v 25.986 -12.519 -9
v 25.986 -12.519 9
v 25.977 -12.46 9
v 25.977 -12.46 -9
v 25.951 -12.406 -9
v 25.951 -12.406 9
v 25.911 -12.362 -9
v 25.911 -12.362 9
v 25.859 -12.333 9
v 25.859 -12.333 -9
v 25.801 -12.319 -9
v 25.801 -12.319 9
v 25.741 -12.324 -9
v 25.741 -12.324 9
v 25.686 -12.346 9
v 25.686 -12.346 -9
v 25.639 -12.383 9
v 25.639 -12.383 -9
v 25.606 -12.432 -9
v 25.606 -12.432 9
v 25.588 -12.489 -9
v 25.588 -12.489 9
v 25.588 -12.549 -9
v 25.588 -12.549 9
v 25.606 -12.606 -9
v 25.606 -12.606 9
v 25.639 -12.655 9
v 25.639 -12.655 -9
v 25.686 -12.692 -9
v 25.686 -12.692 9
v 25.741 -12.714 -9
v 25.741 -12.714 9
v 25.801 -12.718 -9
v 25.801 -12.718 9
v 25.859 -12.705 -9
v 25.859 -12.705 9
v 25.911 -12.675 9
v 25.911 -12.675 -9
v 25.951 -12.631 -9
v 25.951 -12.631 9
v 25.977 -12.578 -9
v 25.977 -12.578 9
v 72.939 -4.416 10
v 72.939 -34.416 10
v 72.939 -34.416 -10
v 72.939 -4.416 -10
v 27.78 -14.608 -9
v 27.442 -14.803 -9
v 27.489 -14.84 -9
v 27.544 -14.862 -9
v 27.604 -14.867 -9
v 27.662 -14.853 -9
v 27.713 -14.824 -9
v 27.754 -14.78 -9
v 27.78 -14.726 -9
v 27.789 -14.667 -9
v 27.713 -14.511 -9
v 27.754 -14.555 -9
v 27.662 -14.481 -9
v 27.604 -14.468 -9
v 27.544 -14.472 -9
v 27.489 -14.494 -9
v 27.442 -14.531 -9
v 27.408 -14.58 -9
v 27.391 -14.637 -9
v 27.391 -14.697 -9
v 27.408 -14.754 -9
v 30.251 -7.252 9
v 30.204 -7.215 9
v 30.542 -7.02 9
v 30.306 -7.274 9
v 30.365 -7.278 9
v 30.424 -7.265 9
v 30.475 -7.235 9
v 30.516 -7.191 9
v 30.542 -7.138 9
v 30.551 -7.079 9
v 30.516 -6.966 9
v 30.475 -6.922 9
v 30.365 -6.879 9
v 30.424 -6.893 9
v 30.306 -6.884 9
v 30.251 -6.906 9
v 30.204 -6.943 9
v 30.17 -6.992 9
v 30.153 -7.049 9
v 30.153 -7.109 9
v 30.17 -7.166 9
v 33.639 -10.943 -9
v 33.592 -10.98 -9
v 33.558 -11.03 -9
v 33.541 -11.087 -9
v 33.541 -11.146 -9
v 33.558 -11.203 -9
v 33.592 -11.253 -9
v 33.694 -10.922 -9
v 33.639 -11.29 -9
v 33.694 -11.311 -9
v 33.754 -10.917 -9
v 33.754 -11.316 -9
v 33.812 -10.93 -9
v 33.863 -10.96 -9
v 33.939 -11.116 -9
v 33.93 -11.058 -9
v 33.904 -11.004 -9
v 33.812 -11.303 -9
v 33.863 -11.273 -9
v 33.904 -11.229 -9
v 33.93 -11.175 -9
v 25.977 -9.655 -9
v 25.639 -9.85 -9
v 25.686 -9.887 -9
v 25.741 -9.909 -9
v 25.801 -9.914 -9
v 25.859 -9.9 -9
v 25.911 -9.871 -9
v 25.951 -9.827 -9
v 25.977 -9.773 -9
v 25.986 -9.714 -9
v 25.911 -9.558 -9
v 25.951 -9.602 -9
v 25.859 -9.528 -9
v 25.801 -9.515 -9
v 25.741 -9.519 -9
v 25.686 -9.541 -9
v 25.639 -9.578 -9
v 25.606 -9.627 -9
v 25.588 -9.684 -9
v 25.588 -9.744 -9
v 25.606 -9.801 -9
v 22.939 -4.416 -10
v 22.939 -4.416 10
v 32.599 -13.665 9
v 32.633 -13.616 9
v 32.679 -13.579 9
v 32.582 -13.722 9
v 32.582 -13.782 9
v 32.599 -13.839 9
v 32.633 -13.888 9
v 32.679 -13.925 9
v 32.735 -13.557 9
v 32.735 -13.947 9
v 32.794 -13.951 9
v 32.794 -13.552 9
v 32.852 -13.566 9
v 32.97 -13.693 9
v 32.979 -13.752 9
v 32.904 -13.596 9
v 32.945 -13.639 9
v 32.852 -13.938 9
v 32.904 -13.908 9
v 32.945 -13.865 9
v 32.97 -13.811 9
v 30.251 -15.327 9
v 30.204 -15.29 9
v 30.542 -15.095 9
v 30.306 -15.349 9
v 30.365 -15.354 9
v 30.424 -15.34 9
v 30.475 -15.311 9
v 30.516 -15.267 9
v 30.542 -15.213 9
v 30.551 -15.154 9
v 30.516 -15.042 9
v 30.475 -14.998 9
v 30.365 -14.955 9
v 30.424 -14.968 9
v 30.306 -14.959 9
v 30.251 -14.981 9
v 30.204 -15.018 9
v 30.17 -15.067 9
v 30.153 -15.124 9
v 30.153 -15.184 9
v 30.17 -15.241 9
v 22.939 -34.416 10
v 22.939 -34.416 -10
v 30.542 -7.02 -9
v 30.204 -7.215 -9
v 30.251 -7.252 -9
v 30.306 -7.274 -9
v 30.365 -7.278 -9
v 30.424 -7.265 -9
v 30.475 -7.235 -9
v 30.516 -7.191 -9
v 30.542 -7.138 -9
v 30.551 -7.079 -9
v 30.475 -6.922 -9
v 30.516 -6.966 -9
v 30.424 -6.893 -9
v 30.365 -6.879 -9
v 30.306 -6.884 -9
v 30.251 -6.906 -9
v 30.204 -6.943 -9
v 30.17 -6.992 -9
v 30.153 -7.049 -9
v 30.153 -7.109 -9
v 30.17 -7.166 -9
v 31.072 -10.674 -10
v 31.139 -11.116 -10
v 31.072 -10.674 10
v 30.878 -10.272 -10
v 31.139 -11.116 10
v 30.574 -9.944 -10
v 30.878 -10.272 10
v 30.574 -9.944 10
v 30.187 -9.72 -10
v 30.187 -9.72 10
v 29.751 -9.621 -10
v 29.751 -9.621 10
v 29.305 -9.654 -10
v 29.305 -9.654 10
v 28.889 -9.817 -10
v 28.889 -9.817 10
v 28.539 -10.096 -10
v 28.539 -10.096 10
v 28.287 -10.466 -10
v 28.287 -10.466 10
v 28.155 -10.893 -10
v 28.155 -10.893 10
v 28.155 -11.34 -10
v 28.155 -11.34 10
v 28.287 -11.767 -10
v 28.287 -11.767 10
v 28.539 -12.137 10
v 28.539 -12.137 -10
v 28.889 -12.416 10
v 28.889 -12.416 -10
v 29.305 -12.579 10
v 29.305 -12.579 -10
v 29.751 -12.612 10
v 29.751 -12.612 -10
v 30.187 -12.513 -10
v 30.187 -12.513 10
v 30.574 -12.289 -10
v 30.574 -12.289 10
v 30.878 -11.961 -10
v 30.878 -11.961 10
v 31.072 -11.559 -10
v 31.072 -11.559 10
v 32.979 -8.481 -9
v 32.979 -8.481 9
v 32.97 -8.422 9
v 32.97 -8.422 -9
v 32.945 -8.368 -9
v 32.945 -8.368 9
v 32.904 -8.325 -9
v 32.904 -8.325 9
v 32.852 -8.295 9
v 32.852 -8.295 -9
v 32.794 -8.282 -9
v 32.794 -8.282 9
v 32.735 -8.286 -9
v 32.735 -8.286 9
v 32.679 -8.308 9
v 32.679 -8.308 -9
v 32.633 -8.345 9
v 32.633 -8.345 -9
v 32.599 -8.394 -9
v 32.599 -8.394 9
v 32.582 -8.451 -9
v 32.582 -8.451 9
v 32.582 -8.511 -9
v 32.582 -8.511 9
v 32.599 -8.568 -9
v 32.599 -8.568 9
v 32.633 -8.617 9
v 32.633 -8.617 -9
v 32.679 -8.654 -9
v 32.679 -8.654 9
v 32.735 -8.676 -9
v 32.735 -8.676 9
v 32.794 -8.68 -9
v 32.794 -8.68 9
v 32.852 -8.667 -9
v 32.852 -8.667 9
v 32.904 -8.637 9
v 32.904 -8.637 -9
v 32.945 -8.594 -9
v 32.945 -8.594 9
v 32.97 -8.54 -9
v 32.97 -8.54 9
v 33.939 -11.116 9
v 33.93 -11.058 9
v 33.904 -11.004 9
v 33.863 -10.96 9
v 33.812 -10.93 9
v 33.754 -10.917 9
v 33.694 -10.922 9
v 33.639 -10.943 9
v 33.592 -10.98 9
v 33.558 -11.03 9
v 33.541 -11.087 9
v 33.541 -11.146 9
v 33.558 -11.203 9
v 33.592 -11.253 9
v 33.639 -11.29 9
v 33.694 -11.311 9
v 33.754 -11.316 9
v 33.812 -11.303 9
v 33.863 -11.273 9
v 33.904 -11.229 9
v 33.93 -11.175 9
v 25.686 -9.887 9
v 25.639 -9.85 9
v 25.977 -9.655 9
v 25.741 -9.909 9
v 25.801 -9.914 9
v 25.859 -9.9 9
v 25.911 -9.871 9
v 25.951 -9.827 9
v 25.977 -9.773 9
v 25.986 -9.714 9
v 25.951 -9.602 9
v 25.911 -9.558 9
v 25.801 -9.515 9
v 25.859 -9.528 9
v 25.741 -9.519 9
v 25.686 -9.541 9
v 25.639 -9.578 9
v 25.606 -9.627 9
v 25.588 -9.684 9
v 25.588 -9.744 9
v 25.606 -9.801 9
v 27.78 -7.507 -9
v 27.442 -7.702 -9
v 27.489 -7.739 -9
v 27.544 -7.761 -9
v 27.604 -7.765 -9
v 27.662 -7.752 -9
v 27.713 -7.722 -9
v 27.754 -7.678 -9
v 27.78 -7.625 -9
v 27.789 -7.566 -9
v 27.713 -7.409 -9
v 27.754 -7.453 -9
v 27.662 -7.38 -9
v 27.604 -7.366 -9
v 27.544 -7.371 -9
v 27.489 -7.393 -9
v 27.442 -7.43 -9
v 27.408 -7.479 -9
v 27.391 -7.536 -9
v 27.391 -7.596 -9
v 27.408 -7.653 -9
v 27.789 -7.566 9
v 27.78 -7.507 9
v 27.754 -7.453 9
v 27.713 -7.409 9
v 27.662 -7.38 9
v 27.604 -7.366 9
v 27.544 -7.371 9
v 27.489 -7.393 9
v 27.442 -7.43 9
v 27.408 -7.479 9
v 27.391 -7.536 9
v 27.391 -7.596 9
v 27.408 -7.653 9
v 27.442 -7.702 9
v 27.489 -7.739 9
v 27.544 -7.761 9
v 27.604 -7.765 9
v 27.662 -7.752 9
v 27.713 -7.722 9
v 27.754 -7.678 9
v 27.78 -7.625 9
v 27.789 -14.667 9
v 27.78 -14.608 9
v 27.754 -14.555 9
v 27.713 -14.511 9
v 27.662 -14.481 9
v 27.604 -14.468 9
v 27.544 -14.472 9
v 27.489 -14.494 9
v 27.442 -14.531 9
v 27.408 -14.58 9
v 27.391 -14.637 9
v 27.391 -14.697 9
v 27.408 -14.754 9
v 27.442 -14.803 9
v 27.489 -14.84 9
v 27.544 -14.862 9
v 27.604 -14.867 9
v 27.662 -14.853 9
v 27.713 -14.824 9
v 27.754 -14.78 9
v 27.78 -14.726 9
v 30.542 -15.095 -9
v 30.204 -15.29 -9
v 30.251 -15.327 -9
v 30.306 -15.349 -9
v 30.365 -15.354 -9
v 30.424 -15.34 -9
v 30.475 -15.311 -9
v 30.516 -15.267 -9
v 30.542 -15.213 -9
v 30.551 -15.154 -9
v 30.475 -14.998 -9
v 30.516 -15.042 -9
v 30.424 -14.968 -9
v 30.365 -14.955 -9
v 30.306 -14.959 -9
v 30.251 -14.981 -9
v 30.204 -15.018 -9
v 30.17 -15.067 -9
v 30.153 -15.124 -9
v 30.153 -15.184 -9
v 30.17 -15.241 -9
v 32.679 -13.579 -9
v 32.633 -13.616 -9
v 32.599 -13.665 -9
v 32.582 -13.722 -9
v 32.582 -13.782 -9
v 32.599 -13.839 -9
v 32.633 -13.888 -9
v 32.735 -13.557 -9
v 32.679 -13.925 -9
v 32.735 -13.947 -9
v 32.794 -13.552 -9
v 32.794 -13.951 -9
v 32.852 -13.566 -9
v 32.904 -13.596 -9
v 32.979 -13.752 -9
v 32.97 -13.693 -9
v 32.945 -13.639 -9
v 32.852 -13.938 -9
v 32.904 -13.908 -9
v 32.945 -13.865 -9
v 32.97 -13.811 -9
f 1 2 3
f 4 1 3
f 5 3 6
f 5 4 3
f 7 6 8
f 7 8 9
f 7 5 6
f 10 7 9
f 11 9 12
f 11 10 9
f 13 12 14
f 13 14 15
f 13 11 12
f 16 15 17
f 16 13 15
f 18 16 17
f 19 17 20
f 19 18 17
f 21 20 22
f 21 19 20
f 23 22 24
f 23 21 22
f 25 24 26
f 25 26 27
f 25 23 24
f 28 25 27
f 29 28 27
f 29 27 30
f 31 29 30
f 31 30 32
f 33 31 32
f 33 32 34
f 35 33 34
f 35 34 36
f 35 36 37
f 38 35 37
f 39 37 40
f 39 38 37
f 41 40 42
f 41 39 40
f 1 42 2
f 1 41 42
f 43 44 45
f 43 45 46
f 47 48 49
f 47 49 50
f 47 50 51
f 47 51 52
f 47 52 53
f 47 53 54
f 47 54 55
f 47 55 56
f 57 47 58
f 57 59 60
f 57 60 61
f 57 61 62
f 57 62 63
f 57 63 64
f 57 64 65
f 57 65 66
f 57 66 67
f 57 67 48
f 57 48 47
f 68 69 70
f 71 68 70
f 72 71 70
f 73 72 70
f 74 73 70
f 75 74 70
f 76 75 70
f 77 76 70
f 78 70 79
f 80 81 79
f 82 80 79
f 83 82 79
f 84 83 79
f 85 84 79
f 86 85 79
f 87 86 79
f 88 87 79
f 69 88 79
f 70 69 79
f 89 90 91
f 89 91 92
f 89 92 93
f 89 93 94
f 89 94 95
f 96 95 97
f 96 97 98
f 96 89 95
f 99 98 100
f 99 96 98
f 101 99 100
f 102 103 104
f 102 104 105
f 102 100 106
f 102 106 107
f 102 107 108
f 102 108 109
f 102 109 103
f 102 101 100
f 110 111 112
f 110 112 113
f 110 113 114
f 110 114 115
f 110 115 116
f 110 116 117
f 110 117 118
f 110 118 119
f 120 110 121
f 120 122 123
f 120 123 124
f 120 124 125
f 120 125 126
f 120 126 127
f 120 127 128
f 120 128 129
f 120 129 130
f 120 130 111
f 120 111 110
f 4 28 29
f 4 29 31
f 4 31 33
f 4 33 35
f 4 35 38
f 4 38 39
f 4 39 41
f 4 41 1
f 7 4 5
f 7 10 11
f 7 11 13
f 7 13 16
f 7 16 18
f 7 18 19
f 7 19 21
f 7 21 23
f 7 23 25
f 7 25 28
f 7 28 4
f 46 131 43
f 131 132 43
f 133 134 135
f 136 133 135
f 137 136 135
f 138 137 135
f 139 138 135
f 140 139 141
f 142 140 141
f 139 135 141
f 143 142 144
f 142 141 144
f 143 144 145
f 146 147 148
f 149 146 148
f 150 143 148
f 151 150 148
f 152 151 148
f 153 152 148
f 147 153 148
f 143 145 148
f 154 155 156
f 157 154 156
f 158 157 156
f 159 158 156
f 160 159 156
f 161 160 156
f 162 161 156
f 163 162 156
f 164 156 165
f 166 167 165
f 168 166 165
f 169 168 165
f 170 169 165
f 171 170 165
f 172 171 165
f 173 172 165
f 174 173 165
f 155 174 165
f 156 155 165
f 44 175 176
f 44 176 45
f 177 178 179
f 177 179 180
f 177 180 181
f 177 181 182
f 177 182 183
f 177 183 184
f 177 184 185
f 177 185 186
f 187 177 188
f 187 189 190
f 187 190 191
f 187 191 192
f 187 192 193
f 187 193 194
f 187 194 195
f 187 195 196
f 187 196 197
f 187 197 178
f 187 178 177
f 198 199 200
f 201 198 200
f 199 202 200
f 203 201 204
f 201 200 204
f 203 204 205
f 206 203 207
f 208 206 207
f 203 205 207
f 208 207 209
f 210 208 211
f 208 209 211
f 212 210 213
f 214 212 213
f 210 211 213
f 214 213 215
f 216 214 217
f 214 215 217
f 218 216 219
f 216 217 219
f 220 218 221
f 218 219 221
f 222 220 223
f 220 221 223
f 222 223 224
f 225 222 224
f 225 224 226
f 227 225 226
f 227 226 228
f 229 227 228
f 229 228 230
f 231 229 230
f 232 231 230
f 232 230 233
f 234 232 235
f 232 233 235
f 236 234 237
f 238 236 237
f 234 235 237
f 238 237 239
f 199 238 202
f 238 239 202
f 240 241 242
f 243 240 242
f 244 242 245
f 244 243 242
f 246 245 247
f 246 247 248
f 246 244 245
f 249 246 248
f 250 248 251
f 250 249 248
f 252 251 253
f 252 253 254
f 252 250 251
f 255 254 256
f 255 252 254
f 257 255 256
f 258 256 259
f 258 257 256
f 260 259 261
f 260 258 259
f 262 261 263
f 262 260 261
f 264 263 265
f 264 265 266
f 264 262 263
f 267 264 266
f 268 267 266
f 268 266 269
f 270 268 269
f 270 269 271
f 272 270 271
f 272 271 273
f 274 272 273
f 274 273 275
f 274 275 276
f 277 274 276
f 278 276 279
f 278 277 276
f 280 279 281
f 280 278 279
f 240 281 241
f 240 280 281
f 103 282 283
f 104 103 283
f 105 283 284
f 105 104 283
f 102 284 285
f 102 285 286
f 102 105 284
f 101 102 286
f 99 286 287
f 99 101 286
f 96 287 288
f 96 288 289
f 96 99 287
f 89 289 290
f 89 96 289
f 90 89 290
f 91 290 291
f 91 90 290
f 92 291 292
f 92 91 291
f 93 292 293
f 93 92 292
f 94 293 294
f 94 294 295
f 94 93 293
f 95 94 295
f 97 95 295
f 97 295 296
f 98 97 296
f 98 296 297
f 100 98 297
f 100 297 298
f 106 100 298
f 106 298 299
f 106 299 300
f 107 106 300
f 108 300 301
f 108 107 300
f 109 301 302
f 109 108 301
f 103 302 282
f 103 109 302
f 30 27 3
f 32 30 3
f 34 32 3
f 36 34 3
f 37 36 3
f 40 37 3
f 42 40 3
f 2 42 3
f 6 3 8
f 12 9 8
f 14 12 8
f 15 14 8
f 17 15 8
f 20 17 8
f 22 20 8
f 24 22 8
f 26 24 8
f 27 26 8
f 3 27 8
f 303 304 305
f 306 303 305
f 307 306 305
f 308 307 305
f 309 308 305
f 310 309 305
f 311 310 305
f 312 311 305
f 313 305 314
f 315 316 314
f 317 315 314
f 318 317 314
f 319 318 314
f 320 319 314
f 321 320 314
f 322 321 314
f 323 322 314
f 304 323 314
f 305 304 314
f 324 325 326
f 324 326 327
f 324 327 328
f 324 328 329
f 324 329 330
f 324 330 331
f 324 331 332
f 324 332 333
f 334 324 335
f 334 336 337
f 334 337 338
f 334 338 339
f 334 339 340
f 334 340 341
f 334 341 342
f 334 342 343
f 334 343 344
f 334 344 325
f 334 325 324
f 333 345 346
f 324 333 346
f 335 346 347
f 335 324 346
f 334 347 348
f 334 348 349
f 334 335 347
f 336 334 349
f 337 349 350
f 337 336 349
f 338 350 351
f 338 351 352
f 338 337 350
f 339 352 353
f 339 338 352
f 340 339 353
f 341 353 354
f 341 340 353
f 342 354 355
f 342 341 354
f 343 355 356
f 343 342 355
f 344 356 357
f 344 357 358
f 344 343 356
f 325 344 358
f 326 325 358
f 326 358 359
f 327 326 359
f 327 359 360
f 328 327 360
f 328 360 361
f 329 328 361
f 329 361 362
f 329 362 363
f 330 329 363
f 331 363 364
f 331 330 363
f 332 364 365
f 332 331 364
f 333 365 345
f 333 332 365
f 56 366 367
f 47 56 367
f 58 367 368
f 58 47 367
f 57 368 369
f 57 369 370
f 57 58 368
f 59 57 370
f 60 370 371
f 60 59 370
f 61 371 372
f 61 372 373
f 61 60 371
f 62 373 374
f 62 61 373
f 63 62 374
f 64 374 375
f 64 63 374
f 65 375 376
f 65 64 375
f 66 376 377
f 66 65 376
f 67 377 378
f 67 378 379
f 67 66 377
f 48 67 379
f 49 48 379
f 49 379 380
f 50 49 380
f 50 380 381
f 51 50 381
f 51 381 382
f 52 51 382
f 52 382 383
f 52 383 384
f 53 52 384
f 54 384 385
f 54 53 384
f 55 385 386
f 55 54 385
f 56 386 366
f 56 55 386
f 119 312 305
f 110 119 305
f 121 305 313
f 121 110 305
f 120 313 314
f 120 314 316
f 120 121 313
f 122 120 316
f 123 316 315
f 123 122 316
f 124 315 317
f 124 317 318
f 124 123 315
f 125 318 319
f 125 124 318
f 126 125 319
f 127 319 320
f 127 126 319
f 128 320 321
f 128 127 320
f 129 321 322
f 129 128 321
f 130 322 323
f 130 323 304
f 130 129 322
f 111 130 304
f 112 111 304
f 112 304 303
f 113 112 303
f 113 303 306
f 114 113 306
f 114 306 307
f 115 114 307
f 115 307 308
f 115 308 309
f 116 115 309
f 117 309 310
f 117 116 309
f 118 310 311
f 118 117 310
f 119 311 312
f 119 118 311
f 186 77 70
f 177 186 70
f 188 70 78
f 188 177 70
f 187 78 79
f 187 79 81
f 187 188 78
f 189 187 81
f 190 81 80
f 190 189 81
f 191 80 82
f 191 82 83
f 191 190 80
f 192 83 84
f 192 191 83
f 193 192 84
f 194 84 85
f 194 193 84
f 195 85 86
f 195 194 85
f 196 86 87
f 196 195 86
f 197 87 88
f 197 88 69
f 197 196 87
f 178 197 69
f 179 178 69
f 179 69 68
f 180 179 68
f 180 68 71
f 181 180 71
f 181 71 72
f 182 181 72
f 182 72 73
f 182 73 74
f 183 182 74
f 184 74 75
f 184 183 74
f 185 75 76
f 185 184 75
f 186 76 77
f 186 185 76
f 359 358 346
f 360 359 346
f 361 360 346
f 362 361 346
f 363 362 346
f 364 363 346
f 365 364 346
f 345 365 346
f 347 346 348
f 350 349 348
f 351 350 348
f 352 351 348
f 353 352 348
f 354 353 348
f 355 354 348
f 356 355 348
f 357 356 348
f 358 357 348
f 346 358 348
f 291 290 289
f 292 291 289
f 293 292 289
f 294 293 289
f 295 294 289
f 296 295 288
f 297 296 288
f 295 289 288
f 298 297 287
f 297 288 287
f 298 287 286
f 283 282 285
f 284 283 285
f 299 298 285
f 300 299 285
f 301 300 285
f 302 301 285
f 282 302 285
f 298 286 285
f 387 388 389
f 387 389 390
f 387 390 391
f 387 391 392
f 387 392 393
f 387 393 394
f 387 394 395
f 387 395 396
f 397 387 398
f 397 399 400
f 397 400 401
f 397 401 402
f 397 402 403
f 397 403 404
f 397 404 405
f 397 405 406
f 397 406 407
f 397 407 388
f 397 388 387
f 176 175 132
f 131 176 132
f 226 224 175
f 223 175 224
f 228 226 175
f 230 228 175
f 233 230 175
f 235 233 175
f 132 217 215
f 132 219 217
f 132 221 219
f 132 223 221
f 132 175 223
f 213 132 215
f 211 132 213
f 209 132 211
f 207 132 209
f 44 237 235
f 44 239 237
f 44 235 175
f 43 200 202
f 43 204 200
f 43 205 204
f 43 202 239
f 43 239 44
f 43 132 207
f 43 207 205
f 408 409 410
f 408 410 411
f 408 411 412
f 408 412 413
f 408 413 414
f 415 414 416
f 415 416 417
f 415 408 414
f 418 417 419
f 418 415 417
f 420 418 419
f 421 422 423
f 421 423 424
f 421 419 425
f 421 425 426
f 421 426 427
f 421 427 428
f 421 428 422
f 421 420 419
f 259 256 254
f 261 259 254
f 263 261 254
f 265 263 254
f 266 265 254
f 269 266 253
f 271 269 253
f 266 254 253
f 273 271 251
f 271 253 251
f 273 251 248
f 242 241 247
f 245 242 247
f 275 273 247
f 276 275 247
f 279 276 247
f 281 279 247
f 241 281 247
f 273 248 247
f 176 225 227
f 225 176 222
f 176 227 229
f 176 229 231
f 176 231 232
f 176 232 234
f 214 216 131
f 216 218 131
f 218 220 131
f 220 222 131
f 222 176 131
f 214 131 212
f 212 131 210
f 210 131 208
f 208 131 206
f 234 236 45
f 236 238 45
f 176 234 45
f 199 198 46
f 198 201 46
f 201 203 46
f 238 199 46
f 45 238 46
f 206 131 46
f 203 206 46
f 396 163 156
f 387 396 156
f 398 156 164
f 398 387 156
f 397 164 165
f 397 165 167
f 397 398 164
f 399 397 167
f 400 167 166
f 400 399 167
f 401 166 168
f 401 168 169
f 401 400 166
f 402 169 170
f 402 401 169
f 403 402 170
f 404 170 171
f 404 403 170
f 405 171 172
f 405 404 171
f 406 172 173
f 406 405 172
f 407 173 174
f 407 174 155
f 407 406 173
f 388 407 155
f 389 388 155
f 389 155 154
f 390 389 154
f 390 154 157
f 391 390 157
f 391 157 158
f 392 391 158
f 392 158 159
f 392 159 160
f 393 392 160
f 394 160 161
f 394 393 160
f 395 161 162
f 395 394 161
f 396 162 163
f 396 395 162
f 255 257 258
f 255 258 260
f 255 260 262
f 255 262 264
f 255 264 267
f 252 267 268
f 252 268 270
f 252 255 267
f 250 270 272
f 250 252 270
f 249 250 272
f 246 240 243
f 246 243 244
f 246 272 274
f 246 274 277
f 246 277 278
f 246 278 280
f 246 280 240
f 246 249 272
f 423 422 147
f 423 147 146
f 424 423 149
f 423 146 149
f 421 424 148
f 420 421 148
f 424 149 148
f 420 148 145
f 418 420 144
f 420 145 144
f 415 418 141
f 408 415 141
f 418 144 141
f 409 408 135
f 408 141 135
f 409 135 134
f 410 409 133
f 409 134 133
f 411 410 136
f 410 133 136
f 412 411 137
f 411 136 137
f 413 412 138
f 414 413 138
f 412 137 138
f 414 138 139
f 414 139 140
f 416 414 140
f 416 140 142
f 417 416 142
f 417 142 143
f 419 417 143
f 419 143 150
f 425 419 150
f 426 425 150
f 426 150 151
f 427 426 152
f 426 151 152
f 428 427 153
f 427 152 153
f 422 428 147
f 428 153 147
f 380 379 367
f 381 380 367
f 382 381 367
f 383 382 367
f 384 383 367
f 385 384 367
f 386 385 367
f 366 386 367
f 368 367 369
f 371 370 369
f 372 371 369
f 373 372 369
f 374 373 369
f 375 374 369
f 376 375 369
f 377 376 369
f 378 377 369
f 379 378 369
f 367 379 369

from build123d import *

# Parameters (mm, degrees)
F0_W     = 50
F0_H     = 30
F1_DEPTH = 10
F2_R     = 1.5
F2_R_2   = 0.2
F3_DEPTH = 9
F4_DEPTH = 12.5


with BuildPart() as f1:
    # F0 (on Top) → F1 (new body, symmetric)
    with BuildSketch(Plane.XY):
        with Locations((47.9385685176, -19.4164868116)):
            Rectangle(F0_W, F0_H)
    extrude(amount=F1_DEPTH, both=True)

    # F2 (on Top) → F3 (cut, symmetric)
    with BuildSketch(Plane.XY):
        with Locations((29.6385685176, -11.1164868116)):
            Circle(F2_R)
        with Locations((33.7385685176, -11.1164868116)):
            Circle(F2_R_2)
        with Locations((32.7793507344, -8.4810576119)):
            Circle(F2_R_2)
        with Locations((30.350526046, -7.0787750243)):
            Circle(F2_R_2)
        with Locations((27.5885685176, -7.5657826561)):
            Circle(F2_R_2)
        with Locations((25.7858287723, -9.714204224)):
            Circle(F2_R_2)
        with Locations((25.7858287723, -12.5187693993)):
            Circle(F2_R_2)
        with Locations((27.5885685176, -14.6671909672)):
            Circle(F2_R_2)
        with Locations((30.350526046, -15.154198599)):
            Circle(F2_R_2)
        with Locations((32.7793507344, -13.7519160114)):
            Circle(F2_R_2)
    extrude(amount=F3_DEPTH, both=True, mode=Mode.SUBTRACT)

    # F2 (on Top) → F4 (cut, symmetric)
    with BuildSketch(Plane.XY):
        with Locations((29.6385685176, -11.1164868116)):
            Circle(F2_R)
    extrude(amount=F4_DEPTH, both=True, mode=Mode.SUBTRACT)


solid = f1.part
